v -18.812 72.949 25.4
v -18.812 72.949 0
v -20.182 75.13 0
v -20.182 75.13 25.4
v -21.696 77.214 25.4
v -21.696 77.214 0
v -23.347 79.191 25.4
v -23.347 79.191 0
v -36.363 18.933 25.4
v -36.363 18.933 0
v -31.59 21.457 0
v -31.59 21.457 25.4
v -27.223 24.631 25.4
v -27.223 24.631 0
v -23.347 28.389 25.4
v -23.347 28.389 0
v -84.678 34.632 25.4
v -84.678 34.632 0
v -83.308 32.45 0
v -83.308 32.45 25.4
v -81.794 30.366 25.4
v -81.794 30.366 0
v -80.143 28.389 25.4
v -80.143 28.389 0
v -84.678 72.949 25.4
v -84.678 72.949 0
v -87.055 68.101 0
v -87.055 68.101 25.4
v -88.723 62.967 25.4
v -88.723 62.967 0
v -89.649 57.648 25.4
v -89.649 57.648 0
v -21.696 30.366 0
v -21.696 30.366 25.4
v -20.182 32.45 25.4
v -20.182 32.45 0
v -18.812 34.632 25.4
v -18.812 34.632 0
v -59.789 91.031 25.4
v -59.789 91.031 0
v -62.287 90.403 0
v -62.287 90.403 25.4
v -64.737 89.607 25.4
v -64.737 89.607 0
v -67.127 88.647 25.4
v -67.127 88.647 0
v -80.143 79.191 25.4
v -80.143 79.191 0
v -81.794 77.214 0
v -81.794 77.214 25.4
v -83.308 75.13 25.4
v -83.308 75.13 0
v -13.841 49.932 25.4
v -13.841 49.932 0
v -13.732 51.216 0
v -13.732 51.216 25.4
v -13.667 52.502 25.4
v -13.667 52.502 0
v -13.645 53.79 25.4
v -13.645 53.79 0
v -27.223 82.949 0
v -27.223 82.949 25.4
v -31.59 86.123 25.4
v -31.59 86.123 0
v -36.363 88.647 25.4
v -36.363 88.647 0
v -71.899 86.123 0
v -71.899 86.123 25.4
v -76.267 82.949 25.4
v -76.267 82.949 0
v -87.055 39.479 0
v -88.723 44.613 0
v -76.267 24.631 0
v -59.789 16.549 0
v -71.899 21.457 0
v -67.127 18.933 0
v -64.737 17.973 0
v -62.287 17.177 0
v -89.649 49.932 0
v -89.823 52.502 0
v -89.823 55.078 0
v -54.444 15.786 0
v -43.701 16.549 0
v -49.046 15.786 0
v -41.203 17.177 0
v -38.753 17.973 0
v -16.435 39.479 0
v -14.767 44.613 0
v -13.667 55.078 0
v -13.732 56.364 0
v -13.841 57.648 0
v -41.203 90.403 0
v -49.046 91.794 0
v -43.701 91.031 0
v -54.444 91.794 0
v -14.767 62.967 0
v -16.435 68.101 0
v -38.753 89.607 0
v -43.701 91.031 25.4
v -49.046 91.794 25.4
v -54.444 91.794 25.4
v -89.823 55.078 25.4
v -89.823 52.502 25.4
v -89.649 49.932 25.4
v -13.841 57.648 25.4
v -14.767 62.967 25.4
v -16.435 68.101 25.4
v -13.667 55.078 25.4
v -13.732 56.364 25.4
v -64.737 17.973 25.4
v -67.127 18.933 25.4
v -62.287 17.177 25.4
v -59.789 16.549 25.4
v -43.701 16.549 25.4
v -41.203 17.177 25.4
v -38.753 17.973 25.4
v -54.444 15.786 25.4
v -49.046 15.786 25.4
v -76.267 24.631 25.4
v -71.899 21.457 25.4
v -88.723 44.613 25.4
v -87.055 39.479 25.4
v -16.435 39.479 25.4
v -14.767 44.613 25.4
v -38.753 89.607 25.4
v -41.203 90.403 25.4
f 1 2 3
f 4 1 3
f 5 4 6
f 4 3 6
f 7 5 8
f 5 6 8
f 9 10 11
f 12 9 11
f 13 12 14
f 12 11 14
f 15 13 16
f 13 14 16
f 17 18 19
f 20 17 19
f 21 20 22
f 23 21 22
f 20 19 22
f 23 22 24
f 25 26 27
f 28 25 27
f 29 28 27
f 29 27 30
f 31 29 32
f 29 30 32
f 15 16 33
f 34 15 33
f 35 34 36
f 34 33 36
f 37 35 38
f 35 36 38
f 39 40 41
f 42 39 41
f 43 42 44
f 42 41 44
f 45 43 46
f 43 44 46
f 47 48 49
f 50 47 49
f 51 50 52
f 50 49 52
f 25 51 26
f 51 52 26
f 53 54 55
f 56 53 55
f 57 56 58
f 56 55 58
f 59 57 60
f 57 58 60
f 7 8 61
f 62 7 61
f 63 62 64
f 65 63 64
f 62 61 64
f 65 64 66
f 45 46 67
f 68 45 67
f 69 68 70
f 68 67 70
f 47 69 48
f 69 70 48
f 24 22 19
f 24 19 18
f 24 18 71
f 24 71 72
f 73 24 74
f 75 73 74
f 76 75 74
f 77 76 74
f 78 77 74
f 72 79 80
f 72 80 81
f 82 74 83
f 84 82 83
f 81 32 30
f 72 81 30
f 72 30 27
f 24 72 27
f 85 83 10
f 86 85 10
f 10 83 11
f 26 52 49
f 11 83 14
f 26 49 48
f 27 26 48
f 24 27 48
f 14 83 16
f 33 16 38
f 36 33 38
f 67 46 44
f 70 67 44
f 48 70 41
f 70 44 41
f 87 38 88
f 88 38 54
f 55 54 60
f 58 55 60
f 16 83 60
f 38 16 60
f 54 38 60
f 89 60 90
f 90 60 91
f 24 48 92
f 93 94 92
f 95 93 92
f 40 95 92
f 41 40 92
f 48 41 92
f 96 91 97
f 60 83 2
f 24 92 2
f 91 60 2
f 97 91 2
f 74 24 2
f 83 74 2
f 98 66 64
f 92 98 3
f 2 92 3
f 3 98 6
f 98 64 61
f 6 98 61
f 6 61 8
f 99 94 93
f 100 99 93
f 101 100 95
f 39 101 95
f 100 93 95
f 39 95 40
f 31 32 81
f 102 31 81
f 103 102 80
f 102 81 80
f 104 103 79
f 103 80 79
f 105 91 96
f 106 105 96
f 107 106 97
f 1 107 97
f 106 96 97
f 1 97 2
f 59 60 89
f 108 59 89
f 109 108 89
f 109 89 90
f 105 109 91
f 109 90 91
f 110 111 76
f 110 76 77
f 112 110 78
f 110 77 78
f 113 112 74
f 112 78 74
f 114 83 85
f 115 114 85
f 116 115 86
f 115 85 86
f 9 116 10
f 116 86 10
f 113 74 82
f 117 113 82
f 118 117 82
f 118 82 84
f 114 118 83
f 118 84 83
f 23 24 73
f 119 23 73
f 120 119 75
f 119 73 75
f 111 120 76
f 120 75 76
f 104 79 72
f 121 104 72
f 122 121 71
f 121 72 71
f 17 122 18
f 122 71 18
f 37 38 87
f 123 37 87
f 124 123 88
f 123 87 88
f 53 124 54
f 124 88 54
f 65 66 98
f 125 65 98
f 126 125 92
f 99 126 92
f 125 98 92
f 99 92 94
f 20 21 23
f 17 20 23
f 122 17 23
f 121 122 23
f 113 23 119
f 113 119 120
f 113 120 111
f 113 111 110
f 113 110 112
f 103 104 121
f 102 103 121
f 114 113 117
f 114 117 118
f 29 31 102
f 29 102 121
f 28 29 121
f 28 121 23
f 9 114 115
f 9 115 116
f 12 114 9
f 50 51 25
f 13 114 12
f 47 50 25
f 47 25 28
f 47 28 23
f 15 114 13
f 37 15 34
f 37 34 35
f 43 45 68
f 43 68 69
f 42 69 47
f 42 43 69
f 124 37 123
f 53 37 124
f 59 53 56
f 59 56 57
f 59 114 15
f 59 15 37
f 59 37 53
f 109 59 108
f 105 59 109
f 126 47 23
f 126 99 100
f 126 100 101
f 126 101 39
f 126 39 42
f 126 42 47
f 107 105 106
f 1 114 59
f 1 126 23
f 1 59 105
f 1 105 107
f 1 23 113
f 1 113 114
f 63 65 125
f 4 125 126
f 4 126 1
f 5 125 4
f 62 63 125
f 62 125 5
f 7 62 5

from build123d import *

# Parameters (mm, degrees)
F1_DEPTH = 25.4


# Not quite as in the source:
# - a feature names something its author has since deleted; it is built from what else it names


with BuildPart() as f1:
    # F0 (on Top) → F1 (new body)
    with BuildSketch(Plane.XY):
        with BuildLine():
            ThreePointArc((-13.8407698917, 49.932215552), (-13.693941355, 51.8586333583), (-13.6449565232, 53.7900174916))
            ThreePointArc((-13.6449565232, 53.7900174916), (-13.693941355, 55.7214016248), (-13.8407698917, 57.6478194312))
            ThreePointArc((-13.8407698917, 57.6478194312), (-15.5097032523, 65.5635649773), (-18.812266294, 72.9485120636))
            ThreePointArc((-18.812266294, 72.9485120636), (-20.9214090375, 76.1846356039), (-23.3473844667, 79.1905667238))
            ThreePointArc((-23.3473844667, 79.1905667238), (-29.3503384108, 84.6135649773), (-36.3629310228, 88.6469148221))
            ThreePointArc((-36.3629310228, 88.6469148221), (-39.9714090375, 90.0252707624), (-43.7009063693, 91.0311675426))
            ThreePointArc((-43.7009063693, 91.0311675426), (-51.7449565232, 91.8900174916), (-59.789006677, 91.0311675426))
            ThreePointArc((-59.789006677, 91.0311675426), (-63.5185040089, 90.0252707624), (-67.1269820235, 88.6469148221))
            ThreePointArc((-67.1269820235, 88.6469148221), (-74.1395746355, 84.6135649773), (-80.1425285796, 79.1905667238))
            ThreePointArc((-80.1425285796, 79.1905667238), (-82.5685040089, 76.1846356039), (-84.6776467524, 72.9485120636))
            ThreePointArc((-84.6776467524, 72.9485120636), (-87.980209794, 65.5635649773), (-89.6491431547, 57.6478194312))
            ThreePointArc((-89.6491431547, 57.6478194312), (-89.8449565232, 53.7900174916), (-89.6491431547, 49.932215552))
            ThreePointArc((-89.6491431547, 49.932215552), (-87.980209794, 42.0164700059), (-84.6776467524, 34.6315229195))
            ThreePointArc((-84.6776467524, 34.6315229195), (-82.5685040089, 31.3953993792), (-80.1425285796, 28.3894682594))
            ThreePointArc((-80.1425285796, 28.3894682594), (-74.1395746355, 22.9664700059), (-67.1269820235, 18.9331201611))
            ThreePointArc((-67.1269820235, 18.9331201611), (-63.5185040089, 17.5547642207), (-59.789006677, 16.5488674406))
            ThreePointArc((-59.789006677, 16.5488674406), (-51.7449565232, 15.6900174916), (-43.7009063693, 16.5488674406))
            ThreePointArc((-43.7009063693, 16.5488674406), (-39.9714090375, 17.5547642207), (-36.3629310228, 18.9331201611))
            ThreePointArc((-36.3629310228, 18.9331201611), (-29.3503384108, 22.9664700059), (-23.3473844667, 28.3894682594))
            ThreePointArc((-23.3473844667, 28.3894682594), (-20.9214090375, 31.3953993792), (-18.812266294, 34.6315229195))
            ThreePointArc((-18.812266294, 34.6315229195), (-15.5097032523, 42.0164700059), (-13.8407698917, 49.932215552))
        make_face()
    extrude(amount=F1_DEPTH)


solid = f1.part
